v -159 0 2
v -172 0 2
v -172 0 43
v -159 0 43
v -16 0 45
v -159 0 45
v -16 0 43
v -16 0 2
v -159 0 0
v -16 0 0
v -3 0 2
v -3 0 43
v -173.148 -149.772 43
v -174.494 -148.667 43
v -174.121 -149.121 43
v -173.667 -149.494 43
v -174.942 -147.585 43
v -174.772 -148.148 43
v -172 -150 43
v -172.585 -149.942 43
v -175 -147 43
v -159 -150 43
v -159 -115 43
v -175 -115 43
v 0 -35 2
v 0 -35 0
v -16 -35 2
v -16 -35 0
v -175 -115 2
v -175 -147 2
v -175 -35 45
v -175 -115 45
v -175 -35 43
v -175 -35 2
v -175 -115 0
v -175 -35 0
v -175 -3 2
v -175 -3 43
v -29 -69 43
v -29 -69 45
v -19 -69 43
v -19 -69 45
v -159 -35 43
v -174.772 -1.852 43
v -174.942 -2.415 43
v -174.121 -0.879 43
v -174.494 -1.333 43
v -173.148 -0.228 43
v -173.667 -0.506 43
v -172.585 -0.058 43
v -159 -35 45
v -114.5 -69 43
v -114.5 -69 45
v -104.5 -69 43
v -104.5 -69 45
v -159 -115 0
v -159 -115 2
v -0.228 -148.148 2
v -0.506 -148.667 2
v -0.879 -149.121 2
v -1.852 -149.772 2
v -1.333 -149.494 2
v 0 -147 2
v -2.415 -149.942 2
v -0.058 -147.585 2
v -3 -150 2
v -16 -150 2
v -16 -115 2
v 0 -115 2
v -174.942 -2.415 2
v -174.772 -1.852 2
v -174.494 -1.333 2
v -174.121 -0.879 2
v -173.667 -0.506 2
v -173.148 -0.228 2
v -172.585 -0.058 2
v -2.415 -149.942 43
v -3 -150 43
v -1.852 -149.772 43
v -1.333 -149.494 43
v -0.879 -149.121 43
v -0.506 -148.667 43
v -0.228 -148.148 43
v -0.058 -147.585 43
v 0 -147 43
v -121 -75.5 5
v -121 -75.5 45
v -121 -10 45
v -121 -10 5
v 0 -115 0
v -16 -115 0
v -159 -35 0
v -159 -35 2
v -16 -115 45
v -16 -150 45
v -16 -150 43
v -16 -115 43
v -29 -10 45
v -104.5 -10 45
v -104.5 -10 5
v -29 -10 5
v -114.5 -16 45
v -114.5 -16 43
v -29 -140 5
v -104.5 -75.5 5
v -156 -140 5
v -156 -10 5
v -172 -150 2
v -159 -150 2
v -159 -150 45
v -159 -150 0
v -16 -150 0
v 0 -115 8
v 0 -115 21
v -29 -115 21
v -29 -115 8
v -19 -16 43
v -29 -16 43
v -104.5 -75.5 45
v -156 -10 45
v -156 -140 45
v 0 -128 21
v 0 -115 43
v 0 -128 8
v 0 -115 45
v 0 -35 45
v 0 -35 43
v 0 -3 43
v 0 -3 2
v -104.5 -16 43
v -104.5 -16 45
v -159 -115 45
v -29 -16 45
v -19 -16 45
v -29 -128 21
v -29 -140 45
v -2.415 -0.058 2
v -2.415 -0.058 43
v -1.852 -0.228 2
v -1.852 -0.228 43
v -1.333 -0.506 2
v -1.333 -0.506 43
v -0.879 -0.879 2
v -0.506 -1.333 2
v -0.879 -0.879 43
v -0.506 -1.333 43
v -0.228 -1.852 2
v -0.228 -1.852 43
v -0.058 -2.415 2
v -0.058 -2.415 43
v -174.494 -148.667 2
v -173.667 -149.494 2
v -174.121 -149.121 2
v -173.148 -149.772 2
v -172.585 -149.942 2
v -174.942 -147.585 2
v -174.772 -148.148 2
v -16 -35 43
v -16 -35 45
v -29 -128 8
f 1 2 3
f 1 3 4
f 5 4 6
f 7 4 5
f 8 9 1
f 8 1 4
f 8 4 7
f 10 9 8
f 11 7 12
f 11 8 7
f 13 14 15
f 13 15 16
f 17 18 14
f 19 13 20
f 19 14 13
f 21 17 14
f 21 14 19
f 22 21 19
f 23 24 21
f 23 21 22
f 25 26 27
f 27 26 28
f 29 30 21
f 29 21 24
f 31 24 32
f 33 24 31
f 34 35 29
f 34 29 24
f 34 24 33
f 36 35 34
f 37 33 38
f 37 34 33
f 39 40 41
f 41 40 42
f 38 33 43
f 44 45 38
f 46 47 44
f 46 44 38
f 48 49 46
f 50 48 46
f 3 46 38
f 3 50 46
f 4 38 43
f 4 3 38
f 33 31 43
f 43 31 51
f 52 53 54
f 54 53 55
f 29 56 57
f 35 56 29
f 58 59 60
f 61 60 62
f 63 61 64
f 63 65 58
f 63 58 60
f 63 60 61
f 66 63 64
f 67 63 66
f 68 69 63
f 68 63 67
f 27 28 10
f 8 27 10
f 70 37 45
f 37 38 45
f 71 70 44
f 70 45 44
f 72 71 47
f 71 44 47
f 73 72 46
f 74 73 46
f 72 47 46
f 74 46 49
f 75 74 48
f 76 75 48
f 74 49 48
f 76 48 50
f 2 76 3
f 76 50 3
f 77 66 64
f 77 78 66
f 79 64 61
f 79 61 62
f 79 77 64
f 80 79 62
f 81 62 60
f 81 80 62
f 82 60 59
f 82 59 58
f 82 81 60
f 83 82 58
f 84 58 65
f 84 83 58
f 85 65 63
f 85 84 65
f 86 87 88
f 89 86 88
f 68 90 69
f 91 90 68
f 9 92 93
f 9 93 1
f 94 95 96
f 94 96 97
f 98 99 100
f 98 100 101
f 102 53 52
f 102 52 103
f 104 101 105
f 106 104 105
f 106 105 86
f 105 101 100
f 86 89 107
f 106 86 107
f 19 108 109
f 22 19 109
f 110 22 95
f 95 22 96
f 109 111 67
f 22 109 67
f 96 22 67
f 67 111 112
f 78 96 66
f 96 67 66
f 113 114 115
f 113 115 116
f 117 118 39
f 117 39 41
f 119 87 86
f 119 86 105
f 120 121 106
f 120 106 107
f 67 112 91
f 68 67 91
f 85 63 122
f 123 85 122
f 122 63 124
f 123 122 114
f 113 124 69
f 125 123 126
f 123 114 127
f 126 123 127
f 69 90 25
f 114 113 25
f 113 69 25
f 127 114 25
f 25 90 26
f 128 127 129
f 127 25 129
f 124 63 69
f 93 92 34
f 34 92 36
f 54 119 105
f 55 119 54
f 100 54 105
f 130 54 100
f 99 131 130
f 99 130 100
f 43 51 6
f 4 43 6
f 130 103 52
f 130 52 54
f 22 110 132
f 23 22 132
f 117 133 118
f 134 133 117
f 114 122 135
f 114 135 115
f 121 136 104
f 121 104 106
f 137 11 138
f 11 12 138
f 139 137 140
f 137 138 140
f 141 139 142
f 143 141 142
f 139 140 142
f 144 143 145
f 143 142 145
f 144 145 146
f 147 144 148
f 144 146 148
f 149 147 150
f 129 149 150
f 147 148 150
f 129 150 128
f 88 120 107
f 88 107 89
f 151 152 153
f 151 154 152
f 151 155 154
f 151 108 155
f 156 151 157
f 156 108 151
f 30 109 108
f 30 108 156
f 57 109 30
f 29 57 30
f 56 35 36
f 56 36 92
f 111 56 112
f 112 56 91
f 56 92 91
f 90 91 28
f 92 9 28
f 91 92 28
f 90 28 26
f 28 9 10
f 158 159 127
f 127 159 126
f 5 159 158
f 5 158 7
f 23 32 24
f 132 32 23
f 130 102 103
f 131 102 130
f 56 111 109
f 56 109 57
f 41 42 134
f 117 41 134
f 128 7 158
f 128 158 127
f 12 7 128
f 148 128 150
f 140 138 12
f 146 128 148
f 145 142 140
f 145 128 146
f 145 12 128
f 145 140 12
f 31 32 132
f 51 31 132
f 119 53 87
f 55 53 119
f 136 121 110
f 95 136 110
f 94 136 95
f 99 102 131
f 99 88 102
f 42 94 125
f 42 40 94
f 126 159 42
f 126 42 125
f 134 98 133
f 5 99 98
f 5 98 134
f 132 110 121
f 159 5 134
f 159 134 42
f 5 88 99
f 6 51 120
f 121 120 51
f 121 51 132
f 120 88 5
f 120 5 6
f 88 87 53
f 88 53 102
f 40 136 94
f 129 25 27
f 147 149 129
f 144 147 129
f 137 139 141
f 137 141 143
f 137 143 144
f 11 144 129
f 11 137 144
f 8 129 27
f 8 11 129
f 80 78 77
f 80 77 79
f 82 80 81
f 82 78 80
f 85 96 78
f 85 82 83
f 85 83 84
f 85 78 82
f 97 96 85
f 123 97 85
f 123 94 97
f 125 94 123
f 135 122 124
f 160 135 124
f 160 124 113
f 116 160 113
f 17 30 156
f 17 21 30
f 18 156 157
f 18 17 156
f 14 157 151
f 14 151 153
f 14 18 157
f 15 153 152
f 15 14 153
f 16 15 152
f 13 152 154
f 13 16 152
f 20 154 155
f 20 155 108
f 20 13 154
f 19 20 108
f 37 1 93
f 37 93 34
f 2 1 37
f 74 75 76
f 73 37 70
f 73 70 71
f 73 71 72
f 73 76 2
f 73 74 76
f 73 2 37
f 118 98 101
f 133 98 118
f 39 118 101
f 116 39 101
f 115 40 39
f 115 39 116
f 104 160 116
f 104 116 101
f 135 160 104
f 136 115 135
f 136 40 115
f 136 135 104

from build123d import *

# Parameters (mm, degrees)
SKETCH2_W           = 175
SKETCH2_H           = 150
BOSS_EXTRUDE1_DEPTH = 45
CUT_EXTRUDE1_DEPTH  = 40
SKETCH5_W           = 13
SKETCH5_H           = 13
CUT_EXTRUDE3_DEPTH  = 50
SKETCH6_W           = 10
SKETCH6_H           = 53
CUT_EXTRUDE4_DEPTH  = 2
SKETCH7_W           = 35
SKETCH7_H           = 130
CUT_EXTRUDE5_DEPTH  = 40
SKETCH9_W           = 16
SKETCH9_H           = 35
CUT_EXTRUDE6_DEPTH  = 2
SKETCH10_W          = 16.5
SKETCH10_H          = 24.5
CUT_EXTRUDE7_DEPTH  = 40
SKETCH11_W          = 16
SKETCH11_H          = 35
CUT_EXTRUDE8_DEPTH  = 2
FILLET1_R           = 3


with BuildPart() as part:
    # Sketch2 → Boss-Extrude1 (new body)
    with BuildSketch(Plane.XY):
        with Locations((-87.5, -75)):
            Rectangle(SKETCH2_W, SKETCH2_H)
    extrude(amount=BOSS_EXTRUDE1_DEPTH)

    # Sketch3 → Cut-Extrude1 (cut)
    with BuildSketch(Plane.XY.offset(45)):
        Polygon((-104.5, -10), (-29, -10), (-29, -140), (-156, -140), (-156, -100), (-104.5, -100), align=None)
    extrude(amount=-CUT_EXTRUDE1_DEPTH, mode=Mode.SUBTRACT)

    # Sketch5 → Cut-Extrude3 (cut)
    with BuildSketch(Plane(origin=(0, 0, 0), x_dir=(0, 0, -1), z_dir=(1, 0, 0))):
        with Locations((-14.5, -121.5)):
            Rectangle(SKETCH5_W, SKETCH5_H)
    extrude(amount=-CUT_EXTRUDE3_DEPTH, mode=Mode.SUBTRACT)

    # Sketch6 → Cut-Extrude4 (cut)
    with BuildSketch(Plane.XY.offset(45)):
        with Locations((-109.5, -42.5)):
            Rectangle(SKETCH6_W, SKETCH6_H)
        with Locations((-24, -42.5)):
            Rectangle(SKETCH6_W, SKETCH6_H)
    extrude(amount=-CUT_EXTRUDE4_DEPTH, mode=Mode.SUBTRACT)

    # Sketch7 → Cut-Extrude5 (cut)
    with BuildSketch(Plane.XY.offset(45)):
        with Locations((-138.5, -75)):
            Rectangle(SKETCH7_W, SKETCH7_H)
    extrude(amount=-CUT_EXTRUDE5_DEPTH, mode=Mode.SUBTRACT)

    # Sketch9 → Cut-Extrude6 (cut)
    with BuildSketch(Plane.XY.offset(45)):
        with Locations((-167, -17.5)):
            Rectangle(SKETCH9_W, SKETCH9_H)
        with Locations((-167, -132.5)):
            Rectangle(SKETCH9_W, SKETCH9_H)
        with Locations((-8, -132.5)):
            Rectangle(SKETCH9_W, SKETCH9_H)
        with Locations((-8, -17.5)):
            Rectangle(SKETCH9_W, SKETCH9_H)
    extrude(amount=-CUT_EXTRUDE6_DEPTH, mode=Mode.SUBTRACT)

    # Sketch10 → Cut-Extrude7 (cut)
    with BuildSketch(Plane.XY.offset(45)):
        with Locations((-112.75, -87.75)):
            Rectangle(SKETCH10_W, SKETCH10_H)
    extrude(amount=-CUT_EXTRUDE7_DEPTH, mode=Mode.SUBTRACT)

    # Sketch11 → Cut-Extrude8 (cut)
    with BuildSketch(Plane(origin=(0, 0, 0), x_dir=(-1, 0, 0), z_dir=(0, 0, -1))):
        with Locations((8, -17.5)):
            Rectangle(SKETCH11_W, SKETCH11_H)
        with Locations((8, -132.5)):
            Rectangle(SKETCH11_W, SKETCH11_H)
        with Locations((167, -132.5)):
            Rectangle(SKETCH11_W, SKETCH11_H)
        with Locations((167, -17.5)):
            Rectangle(SKETCH11_W, SKETCH11_H)
    extrude(amount=-CUT_EXTRUDE8_DEPTH, mode=Mode.SUBTRACT)

    # Fillet1
    fillet1_edges = [part.edges().sort_by_distance(p)[0] for p in [
        (0, -150, 22.5),
        (-175, -150, 22.5),
        (-175, 0, 22.5),
        (0, 0, 22.5),
    ]]
    fillet(fillet1_edges, radius=FILLET1_R)


solid = part.part
